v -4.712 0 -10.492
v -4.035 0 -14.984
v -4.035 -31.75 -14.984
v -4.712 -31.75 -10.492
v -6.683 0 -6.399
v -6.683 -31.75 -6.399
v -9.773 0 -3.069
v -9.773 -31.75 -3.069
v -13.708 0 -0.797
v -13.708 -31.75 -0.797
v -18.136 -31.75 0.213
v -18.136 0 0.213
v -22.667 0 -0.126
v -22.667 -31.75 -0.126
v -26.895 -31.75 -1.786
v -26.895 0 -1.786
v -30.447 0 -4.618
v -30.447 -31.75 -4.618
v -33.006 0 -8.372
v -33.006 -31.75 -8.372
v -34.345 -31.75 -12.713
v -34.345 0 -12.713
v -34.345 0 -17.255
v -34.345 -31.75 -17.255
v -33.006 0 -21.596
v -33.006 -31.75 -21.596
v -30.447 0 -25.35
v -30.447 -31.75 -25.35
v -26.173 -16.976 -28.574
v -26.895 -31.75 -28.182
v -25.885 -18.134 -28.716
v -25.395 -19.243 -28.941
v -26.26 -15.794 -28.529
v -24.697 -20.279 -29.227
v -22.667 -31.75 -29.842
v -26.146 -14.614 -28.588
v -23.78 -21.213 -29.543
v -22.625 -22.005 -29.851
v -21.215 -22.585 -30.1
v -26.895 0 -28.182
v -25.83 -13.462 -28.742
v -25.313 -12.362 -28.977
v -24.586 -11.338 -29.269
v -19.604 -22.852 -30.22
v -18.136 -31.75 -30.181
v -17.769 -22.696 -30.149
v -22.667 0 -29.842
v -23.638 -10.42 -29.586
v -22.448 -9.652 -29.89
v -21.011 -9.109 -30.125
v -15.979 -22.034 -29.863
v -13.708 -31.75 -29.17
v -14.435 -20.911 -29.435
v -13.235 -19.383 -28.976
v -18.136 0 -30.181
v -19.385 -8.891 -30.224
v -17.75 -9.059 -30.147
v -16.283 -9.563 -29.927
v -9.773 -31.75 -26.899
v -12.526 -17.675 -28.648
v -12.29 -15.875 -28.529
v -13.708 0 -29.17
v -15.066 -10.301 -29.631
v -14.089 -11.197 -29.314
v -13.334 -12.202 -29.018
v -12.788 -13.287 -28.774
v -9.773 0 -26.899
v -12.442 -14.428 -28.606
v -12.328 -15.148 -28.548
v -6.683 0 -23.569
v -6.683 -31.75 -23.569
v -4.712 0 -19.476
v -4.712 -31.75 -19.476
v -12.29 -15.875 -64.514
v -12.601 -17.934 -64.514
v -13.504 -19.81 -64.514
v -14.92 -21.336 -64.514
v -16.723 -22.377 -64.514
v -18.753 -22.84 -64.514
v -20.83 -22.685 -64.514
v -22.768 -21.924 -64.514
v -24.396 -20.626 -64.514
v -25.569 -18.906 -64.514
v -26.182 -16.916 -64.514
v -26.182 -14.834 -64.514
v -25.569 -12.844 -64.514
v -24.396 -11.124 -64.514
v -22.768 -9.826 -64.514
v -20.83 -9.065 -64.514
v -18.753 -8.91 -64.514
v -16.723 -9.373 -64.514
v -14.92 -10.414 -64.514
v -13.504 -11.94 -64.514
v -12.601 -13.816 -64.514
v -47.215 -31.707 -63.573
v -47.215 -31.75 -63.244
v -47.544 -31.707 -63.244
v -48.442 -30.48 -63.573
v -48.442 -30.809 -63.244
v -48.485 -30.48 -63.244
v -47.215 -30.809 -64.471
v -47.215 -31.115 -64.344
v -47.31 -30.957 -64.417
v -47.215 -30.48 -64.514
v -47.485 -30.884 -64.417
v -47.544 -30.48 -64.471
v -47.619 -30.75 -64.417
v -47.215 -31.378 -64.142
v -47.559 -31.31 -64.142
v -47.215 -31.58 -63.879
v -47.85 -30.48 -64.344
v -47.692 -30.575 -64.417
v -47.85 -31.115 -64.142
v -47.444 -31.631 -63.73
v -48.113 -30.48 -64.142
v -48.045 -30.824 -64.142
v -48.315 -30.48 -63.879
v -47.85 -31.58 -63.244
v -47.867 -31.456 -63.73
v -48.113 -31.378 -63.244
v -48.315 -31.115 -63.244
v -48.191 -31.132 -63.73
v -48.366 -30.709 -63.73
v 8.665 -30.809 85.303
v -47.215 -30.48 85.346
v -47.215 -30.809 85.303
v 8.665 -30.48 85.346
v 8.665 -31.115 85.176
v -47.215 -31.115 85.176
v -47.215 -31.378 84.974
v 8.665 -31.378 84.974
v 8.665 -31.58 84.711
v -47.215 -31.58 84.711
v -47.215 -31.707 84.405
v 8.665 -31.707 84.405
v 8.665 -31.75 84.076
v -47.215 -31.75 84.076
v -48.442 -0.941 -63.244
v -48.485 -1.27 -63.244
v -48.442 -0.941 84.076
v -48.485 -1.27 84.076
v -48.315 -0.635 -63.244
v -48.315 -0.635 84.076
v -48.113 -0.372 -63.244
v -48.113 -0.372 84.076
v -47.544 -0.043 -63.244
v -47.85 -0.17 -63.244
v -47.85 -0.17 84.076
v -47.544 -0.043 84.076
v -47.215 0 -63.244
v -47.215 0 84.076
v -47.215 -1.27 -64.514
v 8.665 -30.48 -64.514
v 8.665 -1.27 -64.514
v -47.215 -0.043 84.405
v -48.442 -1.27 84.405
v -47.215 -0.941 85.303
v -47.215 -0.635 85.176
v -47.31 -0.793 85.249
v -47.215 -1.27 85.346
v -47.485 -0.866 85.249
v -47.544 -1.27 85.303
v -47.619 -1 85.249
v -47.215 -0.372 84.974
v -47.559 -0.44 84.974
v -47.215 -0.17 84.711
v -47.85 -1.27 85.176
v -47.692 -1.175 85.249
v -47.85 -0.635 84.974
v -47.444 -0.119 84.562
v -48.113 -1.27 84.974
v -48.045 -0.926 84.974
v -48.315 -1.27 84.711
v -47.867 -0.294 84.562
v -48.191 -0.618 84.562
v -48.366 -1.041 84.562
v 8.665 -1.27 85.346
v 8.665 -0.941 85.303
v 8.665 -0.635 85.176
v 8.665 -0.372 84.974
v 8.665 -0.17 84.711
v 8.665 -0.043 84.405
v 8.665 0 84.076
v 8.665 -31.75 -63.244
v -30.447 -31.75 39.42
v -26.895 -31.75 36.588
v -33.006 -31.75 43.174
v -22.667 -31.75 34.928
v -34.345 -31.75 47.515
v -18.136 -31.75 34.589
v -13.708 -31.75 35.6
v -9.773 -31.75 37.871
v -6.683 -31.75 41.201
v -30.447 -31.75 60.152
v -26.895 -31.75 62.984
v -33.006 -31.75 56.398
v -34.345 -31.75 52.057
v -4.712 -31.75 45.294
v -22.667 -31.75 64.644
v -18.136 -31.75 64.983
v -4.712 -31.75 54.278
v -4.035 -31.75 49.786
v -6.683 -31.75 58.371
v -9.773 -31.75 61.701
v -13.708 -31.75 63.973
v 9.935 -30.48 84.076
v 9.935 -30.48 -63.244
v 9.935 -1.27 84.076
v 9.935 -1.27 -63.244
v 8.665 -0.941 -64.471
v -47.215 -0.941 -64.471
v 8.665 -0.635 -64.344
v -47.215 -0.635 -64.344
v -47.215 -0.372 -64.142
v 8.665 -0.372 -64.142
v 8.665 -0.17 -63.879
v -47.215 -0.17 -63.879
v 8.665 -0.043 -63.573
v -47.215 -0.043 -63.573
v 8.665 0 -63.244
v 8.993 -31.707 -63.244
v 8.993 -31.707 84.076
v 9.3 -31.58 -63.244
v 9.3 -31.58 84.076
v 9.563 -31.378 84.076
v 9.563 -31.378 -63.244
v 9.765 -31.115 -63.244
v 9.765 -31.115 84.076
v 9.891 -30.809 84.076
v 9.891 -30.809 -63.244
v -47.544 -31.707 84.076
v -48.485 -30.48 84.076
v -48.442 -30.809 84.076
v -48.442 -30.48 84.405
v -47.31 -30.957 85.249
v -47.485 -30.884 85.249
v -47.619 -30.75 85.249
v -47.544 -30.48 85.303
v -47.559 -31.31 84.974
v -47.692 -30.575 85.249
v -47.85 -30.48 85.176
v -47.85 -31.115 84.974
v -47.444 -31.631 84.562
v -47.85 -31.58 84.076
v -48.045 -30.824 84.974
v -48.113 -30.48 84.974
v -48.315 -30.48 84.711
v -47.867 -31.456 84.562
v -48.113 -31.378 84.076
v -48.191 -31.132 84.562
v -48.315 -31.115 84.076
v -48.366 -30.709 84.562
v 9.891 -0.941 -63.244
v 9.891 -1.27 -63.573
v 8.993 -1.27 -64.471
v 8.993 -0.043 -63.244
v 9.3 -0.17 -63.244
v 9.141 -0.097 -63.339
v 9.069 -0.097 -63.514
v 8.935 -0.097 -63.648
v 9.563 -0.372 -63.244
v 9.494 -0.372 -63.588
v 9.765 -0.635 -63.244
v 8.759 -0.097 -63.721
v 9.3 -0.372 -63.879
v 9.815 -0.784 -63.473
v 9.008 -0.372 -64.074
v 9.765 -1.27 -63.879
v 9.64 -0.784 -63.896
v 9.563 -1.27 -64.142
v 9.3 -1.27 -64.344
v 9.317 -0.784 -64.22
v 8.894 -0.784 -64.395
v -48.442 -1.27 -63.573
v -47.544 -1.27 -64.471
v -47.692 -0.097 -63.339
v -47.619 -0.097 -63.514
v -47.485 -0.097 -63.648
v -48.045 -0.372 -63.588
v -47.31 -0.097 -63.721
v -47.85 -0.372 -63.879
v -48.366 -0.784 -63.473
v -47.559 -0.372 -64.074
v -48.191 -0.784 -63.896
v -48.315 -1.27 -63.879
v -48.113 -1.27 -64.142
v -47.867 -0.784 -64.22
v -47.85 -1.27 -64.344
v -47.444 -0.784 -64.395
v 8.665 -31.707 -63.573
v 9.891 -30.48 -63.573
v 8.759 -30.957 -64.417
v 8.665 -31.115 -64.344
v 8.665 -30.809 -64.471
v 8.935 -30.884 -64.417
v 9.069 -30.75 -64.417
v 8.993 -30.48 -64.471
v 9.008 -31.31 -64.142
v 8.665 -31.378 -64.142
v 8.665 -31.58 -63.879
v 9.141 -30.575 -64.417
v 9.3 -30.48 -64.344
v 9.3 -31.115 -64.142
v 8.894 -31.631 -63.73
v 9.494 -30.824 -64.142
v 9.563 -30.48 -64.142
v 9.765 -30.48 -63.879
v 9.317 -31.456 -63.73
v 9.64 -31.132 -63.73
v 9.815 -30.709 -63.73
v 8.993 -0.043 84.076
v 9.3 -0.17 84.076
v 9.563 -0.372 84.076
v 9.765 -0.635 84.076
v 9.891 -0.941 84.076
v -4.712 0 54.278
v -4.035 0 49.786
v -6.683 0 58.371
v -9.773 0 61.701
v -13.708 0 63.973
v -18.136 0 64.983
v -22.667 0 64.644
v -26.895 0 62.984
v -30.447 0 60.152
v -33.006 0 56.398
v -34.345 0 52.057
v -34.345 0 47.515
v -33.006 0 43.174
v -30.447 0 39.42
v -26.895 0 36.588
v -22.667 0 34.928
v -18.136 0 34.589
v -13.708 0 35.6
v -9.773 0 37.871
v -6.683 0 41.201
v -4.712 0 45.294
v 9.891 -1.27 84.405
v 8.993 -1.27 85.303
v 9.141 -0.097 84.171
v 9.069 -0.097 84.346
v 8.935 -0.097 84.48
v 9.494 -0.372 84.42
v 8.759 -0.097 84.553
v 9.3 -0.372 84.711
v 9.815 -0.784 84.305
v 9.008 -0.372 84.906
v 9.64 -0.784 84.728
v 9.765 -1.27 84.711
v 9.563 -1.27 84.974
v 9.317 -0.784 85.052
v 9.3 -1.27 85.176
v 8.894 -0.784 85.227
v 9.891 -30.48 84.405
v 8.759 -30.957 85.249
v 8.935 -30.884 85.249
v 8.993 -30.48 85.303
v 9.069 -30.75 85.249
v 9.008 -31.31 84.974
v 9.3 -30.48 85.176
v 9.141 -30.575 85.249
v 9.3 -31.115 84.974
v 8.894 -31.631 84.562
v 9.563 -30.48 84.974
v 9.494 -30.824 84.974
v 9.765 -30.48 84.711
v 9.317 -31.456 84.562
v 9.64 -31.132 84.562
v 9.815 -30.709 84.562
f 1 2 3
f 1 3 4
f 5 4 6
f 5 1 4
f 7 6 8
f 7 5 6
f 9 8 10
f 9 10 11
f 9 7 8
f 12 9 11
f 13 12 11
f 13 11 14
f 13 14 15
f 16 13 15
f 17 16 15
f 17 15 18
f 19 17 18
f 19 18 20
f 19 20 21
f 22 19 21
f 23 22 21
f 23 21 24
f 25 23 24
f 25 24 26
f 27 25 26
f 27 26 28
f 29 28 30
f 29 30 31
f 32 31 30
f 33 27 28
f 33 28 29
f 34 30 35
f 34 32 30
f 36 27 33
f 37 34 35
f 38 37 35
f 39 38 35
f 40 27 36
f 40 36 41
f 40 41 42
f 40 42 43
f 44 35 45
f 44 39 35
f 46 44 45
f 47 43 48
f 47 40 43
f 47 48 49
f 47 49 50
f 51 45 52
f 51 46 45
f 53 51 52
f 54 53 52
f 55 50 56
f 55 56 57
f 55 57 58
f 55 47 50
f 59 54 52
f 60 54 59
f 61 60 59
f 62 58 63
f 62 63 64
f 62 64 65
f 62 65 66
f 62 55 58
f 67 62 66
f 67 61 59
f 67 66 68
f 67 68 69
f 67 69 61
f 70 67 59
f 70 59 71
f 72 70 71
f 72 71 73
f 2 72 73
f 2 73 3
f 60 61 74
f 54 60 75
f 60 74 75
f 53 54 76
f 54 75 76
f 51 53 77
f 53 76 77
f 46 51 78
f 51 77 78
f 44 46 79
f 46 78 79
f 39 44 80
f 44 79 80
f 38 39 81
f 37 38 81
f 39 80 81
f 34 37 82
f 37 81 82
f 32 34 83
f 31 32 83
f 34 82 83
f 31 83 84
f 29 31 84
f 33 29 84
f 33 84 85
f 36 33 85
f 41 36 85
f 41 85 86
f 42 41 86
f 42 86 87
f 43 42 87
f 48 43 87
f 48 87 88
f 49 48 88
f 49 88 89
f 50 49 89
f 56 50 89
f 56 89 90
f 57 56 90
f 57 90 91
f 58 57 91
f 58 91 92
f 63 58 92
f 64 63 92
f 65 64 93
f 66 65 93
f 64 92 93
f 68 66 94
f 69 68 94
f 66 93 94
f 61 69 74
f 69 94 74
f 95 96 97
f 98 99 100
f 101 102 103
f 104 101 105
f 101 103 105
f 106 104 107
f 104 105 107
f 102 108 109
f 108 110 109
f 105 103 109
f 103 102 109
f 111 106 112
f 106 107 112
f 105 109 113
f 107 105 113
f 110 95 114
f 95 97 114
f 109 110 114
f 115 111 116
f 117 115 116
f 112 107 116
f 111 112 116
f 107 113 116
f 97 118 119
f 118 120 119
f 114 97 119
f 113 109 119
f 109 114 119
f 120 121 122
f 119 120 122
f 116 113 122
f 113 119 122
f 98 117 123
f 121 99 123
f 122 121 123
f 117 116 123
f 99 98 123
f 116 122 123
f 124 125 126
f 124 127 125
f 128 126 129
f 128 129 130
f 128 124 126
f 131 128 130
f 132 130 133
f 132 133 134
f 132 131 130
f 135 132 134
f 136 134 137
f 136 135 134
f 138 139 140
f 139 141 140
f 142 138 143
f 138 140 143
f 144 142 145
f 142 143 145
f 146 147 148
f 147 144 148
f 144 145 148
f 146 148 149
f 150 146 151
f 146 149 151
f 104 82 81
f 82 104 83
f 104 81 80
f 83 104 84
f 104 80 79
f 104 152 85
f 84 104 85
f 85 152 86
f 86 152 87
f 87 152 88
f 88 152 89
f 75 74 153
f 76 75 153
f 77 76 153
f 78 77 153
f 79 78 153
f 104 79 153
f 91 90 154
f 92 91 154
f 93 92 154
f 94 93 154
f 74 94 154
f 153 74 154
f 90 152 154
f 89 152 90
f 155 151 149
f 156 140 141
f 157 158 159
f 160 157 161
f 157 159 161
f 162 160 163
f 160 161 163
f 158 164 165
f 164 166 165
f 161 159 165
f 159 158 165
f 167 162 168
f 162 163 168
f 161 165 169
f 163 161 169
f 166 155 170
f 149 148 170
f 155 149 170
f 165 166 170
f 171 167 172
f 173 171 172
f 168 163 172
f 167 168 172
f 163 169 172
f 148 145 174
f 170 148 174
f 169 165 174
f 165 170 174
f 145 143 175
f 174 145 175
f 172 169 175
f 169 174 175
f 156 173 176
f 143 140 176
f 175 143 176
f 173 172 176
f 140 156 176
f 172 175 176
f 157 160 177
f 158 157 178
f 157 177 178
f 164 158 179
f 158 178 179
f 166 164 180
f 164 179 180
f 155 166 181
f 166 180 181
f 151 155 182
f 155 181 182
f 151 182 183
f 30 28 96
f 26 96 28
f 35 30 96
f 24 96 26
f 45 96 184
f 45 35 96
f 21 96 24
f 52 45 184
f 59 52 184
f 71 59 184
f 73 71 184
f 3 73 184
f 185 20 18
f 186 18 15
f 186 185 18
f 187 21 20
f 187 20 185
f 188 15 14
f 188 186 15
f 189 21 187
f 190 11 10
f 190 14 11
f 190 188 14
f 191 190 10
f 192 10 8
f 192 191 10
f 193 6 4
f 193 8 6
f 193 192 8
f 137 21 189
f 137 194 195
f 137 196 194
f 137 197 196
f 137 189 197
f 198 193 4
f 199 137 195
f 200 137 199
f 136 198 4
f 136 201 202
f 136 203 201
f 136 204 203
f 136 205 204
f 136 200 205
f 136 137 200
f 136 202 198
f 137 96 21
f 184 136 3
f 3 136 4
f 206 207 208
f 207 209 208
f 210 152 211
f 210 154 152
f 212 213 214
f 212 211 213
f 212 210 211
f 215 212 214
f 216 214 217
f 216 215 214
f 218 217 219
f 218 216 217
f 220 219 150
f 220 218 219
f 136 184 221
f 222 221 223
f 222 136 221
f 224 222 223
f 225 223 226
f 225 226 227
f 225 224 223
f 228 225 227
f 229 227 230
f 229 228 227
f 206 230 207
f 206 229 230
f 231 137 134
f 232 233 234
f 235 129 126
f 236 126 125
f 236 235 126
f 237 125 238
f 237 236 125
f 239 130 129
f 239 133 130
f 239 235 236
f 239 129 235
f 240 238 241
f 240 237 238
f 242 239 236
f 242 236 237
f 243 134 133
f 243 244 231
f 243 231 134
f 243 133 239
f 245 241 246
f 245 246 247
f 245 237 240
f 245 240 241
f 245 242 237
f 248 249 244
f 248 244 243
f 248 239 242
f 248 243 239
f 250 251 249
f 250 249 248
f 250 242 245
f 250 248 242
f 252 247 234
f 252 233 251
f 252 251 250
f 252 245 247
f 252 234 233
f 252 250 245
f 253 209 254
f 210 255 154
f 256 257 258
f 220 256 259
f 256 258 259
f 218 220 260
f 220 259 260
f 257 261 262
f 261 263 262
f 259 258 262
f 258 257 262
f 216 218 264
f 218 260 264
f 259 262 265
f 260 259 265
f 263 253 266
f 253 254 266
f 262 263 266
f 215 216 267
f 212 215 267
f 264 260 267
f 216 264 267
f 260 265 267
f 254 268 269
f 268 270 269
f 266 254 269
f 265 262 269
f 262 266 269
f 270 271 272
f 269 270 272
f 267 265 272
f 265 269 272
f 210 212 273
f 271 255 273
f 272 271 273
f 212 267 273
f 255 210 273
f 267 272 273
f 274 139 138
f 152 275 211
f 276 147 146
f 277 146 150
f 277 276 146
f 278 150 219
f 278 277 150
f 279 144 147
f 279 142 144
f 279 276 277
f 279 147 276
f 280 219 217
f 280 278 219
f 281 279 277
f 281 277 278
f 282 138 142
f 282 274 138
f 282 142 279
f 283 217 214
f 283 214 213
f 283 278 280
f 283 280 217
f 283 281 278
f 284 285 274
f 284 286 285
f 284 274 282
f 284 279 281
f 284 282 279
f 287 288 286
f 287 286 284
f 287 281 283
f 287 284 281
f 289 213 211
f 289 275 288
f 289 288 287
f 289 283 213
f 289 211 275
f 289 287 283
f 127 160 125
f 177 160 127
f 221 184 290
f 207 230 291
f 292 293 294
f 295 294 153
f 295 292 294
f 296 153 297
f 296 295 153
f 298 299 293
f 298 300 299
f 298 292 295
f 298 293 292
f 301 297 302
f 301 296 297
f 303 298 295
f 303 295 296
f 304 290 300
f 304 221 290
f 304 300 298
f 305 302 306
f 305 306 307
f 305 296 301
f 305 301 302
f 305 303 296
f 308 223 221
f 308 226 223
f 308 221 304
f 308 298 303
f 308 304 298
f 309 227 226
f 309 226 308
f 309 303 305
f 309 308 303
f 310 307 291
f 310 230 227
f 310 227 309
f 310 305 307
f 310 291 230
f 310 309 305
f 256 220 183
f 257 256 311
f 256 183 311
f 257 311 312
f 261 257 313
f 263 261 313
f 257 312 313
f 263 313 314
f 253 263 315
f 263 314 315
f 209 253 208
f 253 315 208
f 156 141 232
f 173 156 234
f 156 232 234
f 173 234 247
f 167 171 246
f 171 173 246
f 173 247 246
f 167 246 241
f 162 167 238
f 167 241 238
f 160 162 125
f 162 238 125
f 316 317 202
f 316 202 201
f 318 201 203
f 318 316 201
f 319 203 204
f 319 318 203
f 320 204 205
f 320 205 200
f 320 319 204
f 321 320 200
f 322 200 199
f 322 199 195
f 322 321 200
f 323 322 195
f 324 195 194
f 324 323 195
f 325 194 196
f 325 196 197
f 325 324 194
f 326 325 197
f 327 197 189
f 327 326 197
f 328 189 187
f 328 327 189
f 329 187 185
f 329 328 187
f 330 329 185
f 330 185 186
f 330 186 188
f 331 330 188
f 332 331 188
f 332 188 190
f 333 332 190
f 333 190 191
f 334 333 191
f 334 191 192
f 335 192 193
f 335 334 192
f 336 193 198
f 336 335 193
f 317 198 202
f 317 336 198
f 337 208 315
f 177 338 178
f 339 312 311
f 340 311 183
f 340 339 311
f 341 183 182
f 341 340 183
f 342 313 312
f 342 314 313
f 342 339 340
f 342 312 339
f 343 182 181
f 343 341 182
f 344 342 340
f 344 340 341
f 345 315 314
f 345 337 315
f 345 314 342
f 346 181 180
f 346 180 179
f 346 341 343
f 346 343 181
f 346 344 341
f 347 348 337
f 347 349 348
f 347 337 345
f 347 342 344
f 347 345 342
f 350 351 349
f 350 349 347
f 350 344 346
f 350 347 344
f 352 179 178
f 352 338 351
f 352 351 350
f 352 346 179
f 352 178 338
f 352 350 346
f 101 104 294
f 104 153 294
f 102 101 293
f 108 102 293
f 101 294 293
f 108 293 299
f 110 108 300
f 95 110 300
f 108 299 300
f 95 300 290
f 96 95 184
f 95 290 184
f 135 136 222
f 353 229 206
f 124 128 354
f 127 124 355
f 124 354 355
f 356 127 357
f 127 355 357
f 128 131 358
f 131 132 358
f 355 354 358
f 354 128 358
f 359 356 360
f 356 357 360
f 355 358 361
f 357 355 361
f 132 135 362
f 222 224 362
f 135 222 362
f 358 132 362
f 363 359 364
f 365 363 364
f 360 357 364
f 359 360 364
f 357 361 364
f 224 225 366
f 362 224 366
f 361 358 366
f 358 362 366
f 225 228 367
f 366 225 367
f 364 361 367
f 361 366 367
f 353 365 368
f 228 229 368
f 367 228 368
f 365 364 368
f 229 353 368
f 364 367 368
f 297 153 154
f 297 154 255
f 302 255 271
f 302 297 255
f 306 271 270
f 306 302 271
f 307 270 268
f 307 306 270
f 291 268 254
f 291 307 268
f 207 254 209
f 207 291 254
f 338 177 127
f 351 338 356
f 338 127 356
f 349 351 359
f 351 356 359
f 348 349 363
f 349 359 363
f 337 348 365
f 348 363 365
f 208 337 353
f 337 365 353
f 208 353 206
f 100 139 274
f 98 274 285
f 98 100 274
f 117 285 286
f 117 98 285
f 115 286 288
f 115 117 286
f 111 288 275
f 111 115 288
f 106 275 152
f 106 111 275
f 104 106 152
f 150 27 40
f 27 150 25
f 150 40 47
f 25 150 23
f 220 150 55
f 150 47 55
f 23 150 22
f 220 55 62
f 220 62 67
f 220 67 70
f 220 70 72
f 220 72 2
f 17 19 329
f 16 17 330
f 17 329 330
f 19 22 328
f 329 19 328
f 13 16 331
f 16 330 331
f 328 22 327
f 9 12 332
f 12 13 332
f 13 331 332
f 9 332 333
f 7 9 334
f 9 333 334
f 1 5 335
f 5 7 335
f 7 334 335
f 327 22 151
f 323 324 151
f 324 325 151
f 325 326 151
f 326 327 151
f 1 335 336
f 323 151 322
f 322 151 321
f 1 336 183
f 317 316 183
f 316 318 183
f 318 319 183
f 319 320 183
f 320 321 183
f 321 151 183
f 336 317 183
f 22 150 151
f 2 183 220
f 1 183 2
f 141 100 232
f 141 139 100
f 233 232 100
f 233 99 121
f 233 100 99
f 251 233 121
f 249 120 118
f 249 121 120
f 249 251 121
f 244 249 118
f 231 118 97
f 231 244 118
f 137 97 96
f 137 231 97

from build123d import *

# Parameters (mm, degrees)
F0_W     = 58.42
F0_H     = 149.86
F0_R     = 15.24
F1_DEPTH = 31.75
F2_R     = 6.985
F3_DEPTH = 46.99
F4_R     = 1.27


with BuildPart() as f1:
    # F0 (on Front) → F1 (new body)
    with BuildSketch(Plane.XZ):
        with Locations((-19.275324, 10.416049)):
            Rectangle(F0_W, F0_H)
        with Locations((-19.275324, -14.983951)):
            Circle(F0_R, mode=Mode.SUBTRACT)
        with Locations((-19.275324, 49.786049)):
            Circle(F0_R, mode=Mode.SUBTRACT)
    extrude(amount=F1_DEPTH)

    # F2 (on face) → F3 (cut)
    with BuildSketch(Plane(origin=(0, 0, -64.513951), x_dir=(1, 0, 0), z_dir=(0, 0, -1))):
        with Locations((-19.275324, 15.875)):
            Circle(F2_R)
    extrude(amount=-F3_DEPTH, mode=Mode.SUBTRACT)

    # F4
    f4_edges = [f1.edges().sort_by_distance(p)[0] for p in [
        (-48.485324, -31.75, 10.416049),
        (9.934676, -31.75, 10.416049),
        (-19.275324, -31.75, -64.513951),
        (-19.275324, -31.75, 85.346049),
        (-48.485324, -15.875, -64.513951),
        (9.934676, -15.875, -64.513951),
        (-48.485324, 0, 10.416049),
        (9.934676, -15.875, 85.346049),
        (9.934676, 0, 10.416049),
        (-19.275324, 0, -64.513951),
        (-19.275324, 0, 85.346049),
        (-48.485324, -15.875, 85.346049),
    ]]
    fillet(f4_edges, radius=F4_R)


solid = f1.part
